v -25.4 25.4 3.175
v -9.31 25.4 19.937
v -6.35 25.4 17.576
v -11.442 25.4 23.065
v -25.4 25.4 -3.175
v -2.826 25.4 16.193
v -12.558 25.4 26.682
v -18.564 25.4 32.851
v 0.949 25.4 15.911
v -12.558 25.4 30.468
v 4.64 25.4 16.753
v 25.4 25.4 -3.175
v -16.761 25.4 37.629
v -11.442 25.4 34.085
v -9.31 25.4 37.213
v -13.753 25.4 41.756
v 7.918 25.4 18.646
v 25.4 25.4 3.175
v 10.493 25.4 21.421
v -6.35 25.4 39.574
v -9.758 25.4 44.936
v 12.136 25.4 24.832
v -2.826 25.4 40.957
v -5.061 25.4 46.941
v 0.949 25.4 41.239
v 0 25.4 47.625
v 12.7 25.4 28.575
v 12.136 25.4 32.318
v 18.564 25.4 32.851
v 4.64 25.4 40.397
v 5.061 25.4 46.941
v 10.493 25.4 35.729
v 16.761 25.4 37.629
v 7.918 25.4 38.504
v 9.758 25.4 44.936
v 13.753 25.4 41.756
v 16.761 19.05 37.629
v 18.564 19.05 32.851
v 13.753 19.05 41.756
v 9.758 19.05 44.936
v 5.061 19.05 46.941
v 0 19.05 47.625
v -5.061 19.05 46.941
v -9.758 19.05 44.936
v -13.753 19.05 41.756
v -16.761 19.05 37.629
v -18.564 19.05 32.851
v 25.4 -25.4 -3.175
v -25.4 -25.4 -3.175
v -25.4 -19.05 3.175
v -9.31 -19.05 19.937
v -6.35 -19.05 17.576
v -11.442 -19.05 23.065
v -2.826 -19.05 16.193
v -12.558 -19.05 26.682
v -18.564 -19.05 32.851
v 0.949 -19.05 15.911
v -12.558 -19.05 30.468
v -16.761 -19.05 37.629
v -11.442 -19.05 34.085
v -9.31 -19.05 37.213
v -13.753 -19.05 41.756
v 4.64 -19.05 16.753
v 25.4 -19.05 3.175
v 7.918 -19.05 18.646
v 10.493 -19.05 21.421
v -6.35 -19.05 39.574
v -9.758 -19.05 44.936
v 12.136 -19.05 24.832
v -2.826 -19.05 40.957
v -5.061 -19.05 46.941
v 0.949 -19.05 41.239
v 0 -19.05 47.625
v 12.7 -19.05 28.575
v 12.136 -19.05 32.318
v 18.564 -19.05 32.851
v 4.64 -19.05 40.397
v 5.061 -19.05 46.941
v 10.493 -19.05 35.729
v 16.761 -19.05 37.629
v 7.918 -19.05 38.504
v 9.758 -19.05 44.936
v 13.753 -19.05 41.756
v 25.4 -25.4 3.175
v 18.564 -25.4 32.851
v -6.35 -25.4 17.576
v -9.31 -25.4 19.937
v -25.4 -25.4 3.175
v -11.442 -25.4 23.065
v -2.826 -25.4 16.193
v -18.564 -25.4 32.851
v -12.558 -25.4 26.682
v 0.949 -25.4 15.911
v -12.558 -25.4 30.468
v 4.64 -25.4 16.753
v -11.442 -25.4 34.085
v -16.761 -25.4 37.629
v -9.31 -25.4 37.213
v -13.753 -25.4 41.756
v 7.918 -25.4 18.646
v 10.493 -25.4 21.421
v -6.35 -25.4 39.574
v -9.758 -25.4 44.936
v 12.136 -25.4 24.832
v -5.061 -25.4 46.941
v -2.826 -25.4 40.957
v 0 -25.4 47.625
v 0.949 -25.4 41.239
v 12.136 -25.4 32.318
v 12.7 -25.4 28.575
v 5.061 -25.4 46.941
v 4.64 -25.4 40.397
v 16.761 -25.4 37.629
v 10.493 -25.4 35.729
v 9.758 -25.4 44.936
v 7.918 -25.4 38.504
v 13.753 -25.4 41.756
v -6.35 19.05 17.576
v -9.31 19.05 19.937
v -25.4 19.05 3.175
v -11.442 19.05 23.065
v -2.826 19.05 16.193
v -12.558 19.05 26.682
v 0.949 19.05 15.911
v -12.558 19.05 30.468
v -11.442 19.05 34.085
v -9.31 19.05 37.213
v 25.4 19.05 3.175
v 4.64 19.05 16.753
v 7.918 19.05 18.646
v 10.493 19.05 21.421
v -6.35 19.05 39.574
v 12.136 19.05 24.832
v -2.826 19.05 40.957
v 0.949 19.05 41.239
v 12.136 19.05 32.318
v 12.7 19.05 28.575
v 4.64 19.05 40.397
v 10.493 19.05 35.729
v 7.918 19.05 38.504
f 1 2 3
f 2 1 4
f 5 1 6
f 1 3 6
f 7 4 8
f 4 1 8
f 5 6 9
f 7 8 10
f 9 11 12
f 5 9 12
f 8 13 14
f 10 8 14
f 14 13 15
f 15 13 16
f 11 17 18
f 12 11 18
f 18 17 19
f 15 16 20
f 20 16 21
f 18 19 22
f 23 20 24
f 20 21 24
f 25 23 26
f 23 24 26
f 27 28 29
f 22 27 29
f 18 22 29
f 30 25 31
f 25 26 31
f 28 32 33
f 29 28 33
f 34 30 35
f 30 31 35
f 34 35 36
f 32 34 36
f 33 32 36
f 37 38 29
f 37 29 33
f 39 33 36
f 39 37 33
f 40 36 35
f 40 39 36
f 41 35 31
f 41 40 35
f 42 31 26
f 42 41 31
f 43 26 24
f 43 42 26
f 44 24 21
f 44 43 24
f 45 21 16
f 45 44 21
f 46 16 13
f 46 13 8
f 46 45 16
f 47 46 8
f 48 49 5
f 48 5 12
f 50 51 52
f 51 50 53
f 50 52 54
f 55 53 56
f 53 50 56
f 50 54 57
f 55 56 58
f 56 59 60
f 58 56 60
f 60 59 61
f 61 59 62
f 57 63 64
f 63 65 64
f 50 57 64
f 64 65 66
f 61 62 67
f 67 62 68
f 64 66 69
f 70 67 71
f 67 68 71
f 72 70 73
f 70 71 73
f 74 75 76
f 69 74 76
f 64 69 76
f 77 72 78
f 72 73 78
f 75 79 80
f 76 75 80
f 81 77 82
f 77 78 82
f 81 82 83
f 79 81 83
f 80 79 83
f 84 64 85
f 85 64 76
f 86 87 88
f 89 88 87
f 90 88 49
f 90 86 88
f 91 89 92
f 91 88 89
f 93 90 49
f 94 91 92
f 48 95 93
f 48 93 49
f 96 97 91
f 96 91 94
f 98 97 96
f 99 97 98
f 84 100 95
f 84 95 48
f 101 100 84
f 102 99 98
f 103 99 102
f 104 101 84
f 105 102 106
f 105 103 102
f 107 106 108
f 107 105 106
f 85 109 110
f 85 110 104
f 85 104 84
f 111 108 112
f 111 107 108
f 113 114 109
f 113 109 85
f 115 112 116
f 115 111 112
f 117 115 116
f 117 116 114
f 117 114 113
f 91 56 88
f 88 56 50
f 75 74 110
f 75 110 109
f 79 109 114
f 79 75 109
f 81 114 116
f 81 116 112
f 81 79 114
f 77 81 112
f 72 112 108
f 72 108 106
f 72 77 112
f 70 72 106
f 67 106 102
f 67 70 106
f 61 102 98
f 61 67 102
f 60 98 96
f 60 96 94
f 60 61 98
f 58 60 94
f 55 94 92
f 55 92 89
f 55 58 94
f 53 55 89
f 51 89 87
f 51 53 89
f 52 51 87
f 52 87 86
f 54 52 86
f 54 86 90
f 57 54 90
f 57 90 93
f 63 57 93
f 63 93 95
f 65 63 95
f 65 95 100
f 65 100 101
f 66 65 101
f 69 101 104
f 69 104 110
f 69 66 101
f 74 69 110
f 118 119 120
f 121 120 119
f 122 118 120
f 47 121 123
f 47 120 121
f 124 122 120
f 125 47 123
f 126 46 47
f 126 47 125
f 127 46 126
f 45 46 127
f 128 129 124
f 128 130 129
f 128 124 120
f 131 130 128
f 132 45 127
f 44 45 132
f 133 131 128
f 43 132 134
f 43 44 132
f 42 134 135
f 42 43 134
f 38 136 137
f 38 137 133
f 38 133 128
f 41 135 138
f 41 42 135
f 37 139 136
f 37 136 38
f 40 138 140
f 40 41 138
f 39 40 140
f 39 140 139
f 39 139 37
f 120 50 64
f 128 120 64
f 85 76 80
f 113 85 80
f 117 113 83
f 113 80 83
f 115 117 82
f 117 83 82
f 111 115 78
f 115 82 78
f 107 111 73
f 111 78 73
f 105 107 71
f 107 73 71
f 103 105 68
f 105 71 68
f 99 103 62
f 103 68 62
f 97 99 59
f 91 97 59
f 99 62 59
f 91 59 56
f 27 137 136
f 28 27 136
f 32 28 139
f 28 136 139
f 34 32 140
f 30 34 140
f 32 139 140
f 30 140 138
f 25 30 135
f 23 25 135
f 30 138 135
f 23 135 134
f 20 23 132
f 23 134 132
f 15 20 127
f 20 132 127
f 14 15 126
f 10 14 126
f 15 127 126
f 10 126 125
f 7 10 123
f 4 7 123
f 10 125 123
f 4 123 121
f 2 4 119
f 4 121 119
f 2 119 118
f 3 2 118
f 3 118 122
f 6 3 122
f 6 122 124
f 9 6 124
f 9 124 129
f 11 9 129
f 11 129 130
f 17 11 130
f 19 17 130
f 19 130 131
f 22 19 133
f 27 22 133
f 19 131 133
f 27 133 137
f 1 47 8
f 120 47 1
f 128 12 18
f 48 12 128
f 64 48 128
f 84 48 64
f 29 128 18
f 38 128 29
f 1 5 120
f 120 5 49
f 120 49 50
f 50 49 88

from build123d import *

# Parameters (mm, degrees)
F0_W     = 50.8
F0_H     = 6.35
F1_DEPTH = 25.4
F2_START = 19.05
F0_R     = 12.7
F2_DEPTH = 6.35


with BuildPart() as f1:
    # F0 (on Front) → F1 (new body)
    with BuildSketch(Plane.XZ):
        Rectangle(F0_W, F0_H)
    extrude(amount=F1_DEPTH)

    # F0 (on Front) → F2 (join)
    with BuildSketch(Plane.XZ.offset(F2_START)):
        with BuildLine():
            Line((-25.4, 3.175), (25.4, 3.175))
            Line((25.4, 3.175), (18.5638238149, 32.8513238149))
            ThreePointArc((18.5638238149, 32.8513238149), (18.9280657183, 30.7269359106), (19.05, 28.575))
            ThreePointArc((19.05, 28.575), (-2.1519359106, 9.6469342817), (-18.5638238149, 32.8513238149))
            Line((-18.5638238149, 32.8513238149), (-25.4, 3.175))
        make_face()
        with BuildLine():
            ThreePointArc((19.05, 28.575), (18.9280657183, 30.7269359106), (18.5638238149, 32.8513238149))
            ThreePointArc((18.5638238149, 32.8513238149), (0, 47.625), (-18.5638238149, 32.8513238149))
            ThreePointArc((-18.5638238149, 32.8513238149), (-2.1519359106, 9.6469342817), (19.05, 28.575))
        make_face()
        with Locations((0, 28.575)):
            Circle(F0_R, mode=Mode.SUBTRACT)
    extrude(amount=F2_DEPTH)

    # F3: F1 across plane


with BuildPart() as f1_1:
    add(f1.part)
    add(f1.part.mirror(Plane.XZ))


solid = f1_1.part
